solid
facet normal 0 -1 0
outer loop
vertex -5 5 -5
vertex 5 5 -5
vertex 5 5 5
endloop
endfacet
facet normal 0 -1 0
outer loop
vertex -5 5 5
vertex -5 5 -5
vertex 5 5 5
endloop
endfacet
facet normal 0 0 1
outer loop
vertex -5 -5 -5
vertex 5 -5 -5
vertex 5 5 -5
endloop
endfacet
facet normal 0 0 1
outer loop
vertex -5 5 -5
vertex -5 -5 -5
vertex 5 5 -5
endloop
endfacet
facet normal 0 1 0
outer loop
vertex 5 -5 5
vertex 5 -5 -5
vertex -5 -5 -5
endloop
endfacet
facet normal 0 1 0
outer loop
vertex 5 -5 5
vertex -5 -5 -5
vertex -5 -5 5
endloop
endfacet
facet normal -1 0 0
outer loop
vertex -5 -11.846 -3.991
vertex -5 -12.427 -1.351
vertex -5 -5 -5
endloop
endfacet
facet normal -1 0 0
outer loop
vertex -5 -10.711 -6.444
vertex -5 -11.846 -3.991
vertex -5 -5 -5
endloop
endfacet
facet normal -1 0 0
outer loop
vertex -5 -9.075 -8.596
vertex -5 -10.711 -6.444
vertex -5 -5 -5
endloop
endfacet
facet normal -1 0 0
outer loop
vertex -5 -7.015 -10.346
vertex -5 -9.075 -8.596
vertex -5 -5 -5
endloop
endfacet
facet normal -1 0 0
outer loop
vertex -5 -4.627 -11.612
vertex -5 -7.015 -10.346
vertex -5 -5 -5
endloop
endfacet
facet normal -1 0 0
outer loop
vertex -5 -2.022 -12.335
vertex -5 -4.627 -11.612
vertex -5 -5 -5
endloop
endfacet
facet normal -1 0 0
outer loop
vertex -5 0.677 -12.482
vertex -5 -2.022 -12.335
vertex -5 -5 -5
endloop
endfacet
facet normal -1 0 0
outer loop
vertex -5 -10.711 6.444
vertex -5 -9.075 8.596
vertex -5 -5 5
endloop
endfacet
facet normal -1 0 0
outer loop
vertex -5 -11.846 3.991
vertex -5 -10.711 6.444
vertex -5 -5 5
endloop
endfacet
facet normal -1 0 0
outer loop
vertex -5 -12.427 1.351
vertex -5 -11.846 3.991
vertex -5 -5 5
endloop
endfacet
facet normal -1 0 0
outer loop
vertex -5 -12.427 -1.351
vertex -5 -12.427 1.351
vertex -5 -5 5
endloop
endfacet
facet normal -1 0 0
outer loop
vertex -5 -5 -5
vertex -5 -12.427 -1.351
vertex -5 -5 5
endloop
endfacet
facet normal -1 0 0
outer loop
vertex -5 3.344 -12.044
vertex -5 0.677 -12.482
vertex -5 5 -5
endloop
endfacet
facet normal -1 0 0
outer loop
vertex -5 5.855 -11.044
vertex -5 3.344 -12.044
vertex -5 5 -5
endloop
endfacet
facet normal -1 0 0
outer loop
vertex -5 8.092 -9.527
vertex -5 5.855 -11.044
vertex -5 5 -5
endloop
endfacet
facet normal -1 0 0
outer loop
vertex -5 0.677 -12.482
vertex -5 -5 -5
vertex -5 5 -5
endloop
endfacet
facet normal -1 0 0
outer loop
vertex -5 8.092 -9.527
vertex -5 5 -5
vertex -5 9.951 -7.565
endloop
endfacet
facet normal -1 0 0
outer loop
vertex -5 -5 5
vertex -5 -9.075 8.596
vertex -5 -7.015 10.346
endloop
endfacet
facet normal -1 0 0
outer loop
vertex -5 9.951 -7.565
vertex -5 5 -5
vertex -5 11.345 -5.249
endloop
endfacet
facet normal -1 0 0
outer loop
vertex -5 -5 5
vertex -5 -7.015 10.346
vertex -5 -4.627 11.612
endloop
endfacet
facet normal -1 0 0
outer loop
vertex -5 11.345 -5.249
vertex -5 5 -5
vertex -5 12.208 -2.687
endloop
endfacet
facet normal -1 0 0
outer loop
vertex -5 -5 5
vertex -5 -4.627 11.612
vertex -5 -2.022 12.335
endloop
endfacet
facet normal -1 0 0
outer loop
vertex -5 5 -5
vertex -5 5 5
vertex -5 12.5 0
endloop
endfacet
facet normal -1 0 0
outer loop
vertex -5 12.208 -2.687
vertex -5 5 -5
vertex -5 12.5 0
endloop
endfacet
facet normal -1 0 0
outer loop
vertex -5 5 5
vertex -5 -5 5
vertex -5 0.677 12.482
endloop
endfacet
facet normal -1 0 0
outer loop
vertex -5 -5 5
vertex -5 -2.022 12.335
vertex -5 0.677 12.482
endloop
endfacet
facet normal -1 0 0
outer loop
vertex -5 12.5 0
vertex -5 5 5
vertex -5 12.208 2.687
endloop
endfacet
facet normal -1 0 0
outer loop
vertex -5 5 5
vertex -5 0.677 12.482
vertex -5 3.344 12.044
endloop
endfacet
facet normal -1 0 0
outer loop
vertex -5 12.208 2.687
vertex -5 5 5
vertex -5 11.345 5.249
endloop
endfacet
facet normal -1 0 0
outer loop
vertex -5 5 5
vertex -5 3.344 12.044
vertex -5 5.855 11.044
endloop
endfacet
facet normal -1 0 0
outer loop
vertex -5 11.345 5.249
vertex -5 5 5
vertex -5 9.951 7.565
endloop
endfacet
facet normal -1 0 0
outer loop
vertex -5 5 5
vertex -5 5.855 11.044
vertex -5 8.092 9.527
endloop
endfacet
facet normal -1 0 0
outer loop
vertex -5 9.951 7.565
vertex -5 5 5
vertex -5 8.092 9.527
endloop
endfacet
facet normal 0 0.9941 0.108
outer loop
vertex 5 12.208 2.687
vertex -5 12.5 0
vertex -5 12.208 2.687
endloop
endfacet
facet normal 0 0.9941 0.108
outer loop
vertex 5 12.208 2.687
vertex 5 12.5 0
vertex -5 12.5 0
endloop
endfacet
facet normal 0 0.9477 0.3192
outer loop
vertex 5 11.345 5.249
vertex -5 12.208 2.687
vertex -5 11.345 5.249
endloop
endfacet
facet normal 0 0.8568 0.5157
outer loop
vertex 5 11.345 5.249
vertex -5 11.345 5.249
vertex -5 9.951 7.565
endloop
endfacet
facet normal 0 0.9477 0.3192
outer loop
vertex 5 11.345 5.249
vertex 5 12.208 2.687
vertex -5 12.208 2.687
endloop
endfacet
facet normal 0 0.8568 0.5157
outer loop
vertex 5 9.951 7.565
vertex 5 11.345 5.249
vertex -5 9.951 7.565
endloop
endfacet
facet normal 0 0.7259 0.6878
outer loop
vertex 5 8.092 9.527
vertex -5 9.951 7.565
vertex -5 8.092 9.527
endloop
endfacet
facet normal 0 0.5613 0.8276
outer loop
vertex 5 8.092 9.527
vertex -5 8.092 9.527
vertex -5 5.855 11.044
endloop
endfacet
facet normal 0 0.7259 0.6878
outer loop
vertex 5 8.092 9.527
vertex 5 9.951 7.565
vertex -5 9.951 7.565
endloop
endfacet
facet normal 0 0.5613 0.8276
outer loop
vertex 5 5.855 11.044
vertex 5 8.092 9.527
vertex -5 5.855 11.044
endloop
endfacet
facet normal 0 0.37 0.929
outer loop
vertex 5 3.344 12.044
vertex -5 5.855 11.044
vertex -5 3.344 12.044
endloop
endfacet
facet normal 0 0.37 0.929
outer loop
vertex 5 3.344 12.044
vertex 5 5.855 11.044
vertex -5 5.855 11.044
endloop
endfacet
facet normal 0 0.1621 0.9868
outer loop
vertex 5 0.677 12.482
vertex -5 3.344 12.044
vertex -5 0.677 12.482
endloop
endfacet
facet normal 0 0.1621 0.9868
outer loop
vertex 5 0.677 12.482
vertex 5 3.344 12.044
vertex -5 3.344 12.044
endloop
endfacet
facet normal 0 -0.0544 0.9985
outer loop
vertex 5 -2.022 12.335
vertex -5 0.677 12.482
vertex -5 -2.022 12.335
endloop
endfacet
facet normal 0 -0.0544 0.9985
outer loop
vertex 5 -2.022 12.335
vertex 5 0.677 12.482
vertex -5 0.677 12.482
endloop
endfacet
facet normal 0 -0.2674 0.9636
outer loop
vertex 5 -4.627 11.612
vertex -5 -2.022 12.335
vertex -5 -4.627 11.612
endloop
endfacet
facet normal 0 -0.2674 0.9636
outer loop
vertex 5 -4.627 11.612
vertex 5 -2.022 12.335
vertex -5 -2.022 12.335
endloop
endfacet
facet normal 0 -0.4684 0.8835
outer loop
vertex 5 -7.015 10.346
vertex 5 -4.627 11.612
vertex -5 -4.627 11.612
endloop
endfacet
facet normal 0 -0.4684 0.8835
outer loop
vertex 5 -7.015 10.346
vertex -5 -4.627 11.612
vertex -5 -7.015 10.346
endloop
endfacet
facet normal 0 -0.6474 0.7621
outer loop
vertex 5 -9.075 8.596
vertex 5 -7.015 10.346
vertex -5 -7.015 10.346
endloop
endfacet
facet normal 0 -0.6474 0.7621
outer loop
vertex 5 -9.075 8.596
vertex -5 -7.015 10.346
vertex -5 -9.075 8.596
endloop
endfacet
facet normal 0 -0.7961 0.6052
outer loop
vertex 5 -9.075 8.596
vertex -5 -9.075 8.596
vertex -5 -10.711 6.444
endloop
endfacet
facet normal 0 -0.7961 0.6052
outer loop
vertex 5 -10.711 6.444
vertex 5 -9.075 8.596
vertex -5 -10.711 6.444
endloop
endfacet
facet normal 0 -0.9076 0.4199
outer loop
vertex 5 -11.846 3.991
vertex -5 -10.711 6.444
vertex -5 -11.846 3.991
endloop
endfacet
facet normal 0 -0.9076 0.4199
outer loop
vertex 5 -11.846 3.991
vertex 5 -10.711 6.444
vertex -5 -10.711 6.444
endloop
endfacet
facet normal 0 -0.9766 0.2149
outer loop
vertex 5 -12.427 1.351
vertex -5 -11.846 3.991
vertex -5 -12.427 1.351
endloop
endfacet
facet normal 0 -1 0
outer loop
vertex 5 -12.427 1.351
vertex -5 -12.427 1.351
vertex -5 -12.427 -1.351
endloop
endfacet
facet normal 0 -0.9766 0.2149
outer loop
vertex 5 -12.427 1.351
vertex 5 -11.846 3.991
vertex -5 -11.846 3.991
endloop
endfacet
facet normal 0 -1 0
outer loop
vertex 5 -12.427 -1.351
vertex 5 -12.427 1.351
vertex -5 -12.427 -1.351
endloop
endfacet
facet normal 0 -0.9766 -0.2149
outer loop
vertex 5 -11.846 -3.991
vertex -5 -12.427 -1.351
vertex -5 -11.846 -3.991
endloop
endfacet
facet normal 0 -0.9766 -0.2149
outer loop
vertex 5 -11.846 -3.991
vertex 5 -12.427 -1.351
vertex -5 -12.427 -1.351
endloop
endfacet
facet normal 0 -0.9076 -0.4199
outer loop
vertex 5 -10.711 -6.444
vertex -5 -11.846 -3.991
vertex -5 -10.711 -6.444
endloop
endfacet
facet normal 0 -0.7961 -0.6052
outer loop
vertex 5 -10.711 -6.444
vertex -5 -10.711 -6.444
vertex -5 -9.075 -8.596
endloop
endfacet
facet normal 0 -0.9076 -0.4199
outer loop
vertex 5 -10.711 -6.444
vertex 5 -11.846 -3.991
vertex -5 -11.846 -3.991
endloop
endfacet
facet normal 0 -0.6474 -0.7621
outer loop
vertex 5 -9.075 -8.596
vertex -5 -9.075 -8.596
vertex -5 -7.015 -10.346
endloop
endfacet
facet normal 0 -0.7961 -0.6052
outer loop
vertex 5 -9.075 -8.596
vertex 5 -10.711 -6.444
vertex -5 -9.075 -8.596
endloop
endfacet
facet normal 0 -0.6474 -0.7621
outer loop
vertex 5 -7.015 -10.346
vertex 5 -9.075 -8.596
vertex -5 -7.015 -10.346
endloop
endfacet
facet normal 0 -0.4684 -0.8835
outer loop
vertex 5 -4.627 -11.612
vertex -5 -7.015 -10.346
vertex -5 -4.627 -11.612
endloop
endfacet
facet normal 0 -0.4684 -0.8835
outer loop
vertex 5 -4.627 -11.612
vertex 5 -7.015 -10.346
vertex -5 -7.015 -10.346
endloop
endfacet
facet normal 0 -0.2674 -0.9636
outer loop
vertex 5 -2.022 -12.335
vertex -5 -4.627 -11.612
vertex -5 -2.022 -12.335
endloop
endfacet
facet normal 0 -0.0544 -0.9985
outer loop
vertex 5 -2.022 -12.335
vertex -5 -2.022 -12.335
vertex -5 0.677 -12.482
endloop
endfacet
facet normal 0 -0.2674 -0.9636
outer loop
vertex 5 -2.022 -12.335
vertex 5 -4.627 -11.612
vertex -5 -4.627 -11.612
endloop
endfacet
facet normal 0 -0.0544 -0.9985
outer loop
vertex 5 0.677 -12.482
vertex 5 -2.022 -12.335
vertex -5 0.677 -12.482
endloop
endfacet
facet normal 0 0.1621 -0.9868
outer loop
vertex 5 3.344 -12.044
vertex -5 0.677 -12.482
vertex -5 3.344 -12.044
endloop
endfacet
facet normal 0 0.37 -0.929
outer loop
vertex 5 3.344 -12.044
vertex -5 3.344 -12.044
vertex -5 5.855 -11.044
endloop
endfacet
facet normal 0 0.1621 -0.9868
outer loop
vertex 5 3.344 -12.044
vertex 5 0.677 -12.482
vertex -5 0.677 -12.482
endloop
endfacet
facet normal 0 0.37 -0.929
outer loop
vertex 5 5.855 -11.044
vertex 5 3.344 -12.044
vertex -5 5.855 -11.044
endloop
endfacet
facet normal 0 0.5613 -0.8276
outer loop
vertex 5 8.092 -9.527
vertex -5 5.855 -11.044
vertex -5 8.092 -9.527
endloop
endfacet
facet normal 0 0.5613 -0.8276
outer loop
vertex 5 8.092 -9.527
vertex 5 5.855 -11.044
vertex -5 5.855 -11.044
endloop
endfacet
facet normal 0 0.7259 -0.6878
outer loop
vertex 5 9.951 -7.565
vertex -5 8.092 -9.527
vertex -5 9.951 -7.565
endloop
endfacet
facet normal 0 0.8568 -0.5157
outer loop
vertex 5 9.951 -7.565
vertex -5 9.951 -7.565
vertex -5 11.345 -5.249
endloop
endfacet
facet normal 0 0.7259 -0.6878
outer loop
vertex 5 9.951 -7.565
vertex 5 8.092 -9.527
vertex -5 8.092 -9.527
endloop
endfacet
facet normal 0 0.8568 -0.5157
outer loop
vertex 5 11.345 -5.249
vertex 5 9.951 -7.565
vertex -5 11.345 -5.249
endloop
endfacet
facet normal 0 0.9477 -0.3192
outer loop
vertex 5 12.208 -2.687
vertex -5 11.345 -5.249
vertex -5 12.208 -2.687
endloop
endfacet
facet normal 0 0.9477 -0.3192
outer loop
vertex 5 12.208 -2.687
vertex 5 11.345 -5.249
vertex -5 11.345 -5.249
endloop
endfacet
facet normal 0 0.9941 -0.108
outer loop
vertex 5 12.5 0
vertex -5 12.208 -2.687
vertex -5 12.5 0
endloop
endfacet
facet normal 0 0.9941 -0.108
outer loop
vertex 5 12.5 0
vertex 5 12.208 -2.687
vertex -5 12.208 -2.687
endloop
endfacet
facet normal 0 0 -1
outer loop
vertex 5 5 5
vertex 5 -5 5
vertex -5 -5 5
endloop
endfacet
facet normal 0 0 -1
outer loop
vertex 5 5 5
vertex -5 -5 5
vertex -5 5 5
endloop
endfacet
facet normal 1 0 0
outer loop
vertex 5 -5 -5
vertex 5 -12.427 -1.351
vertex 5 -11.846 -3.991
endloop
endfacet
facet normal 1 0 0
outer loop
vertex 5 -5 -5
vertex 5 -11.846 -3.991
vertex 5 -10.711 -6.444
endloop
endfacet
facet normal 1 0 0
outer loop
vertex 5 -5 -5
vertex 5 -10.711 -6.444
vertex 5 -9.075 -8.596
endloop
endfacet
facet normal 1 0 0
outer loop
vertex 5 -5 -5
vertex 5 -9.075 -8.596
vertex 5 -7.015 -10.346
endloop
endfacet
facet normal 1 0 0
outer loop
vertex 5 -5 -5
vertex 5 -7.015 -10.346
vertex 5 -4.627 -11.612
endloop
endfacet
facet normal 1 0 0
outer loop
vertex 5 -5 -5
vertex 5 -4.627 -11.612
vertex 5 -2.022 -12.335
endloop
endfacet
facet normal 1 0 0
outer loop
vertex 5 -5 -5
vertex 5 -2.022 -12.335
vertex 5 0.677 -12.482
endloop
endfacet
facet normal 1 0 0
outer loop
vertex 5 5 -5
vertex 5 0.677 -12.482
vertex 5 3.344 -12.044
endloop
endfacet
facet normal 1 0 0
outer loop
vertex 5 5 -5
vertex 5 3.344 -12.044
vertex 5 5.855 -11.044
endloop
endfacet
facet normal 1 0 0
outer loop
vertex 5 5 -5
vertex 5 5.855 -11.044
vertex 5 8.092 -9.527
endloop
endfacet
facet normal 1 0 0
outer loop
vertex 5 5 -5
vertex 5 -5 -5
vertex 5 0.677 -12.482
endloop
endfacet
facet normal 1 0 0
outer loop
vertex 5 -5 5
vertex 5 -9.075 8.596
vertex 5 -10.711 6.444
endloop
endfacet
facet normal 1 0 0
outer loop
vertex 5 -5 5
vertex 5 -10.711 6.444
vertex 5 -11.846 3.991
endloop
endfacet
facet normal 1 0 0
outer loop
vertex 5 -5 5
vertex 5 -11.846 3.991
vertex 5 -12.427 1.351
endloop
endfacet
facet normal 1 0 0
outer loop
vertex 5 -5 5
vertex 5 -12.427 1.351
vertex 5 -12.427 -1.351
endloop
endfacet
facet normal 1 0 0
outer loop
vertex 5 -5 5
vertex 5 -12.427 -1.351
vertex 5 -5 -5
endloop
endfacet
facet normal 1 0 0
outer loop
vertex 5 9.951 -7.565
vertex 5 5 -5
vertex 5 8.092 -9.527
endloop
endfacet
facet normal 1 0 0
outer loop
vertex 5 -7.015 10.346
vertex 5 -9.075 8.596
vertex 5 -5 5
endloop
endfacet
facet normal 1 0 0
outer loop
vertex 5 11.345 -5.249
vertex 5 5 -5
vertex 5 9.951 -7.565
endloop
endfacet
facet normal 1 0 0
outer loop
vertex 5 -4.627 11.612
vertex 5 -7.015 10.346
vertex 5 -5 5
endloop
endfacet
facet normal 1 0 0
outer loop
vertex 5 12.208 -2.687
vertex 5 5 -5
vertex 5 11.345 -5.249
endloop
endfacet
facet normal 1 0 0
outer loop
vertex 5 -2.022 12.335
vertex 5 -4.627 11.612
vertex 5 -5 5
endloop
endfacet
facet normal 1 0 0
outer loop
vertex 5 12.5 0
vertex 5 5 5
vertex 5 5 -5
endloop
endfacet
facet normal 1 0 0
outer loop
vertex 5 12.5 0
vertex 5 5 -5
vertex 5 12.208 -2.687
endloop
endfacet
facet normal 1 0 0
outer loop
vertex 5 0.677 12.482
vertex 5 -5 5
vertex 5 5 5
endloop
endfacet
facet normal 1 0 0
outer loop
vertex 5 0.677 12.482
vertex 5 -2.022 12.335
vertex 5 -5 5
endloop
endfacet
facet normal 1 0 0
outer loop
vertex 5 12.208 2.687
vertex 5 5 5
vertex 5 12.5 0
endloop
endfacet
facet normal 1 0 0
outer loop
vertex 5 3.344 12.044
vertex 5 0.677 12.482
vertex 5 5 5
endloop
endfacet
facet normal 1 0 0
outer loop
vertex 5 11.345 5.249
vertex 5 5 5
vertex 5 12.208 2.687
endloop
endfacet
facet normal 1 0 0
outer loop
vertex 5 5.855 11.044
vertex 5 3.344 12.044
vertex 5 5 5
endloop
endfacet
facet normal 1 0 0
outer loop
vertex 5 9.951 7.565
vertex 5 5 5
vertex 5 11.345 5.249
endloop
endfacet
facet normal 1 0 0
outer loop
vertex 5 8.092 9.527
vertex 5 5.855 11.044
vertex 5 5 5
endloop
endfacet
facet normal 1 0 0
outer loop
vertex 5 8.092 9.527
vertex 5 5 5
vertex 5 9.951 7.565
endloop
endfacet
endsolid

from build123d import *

# Parameters (mm, degrees)
F0_R          = 12.5
F2_DEPTH      = 5
F1_W          = 10
F1_H          = 10
F3_DEPTH      = 5.001
F3_DEPTH_BACK = 5.001


with BuildPart() as f2:
    # F0 (on Right) → F2 (new body, symmetric)
    with BuildSketch(Plane.YZ):
        Circle(F0_R)
    extrude(amount=F2_DEPTH, both=True)

    # F1 (on Right) → F3 (cut, two sides)
    with BuildSketch(Plane.YZ) as f3_sk:
        Rectangle(F1_W, F1_H)
    extrude(amount=-F3_DEPTH, mode=Mode.SUBTRACT)
    extrude(f3_sk.sketch, amount=F3_DEPTH_BACK, mode=Mode.SUBTRACT)


solid = f2.part
